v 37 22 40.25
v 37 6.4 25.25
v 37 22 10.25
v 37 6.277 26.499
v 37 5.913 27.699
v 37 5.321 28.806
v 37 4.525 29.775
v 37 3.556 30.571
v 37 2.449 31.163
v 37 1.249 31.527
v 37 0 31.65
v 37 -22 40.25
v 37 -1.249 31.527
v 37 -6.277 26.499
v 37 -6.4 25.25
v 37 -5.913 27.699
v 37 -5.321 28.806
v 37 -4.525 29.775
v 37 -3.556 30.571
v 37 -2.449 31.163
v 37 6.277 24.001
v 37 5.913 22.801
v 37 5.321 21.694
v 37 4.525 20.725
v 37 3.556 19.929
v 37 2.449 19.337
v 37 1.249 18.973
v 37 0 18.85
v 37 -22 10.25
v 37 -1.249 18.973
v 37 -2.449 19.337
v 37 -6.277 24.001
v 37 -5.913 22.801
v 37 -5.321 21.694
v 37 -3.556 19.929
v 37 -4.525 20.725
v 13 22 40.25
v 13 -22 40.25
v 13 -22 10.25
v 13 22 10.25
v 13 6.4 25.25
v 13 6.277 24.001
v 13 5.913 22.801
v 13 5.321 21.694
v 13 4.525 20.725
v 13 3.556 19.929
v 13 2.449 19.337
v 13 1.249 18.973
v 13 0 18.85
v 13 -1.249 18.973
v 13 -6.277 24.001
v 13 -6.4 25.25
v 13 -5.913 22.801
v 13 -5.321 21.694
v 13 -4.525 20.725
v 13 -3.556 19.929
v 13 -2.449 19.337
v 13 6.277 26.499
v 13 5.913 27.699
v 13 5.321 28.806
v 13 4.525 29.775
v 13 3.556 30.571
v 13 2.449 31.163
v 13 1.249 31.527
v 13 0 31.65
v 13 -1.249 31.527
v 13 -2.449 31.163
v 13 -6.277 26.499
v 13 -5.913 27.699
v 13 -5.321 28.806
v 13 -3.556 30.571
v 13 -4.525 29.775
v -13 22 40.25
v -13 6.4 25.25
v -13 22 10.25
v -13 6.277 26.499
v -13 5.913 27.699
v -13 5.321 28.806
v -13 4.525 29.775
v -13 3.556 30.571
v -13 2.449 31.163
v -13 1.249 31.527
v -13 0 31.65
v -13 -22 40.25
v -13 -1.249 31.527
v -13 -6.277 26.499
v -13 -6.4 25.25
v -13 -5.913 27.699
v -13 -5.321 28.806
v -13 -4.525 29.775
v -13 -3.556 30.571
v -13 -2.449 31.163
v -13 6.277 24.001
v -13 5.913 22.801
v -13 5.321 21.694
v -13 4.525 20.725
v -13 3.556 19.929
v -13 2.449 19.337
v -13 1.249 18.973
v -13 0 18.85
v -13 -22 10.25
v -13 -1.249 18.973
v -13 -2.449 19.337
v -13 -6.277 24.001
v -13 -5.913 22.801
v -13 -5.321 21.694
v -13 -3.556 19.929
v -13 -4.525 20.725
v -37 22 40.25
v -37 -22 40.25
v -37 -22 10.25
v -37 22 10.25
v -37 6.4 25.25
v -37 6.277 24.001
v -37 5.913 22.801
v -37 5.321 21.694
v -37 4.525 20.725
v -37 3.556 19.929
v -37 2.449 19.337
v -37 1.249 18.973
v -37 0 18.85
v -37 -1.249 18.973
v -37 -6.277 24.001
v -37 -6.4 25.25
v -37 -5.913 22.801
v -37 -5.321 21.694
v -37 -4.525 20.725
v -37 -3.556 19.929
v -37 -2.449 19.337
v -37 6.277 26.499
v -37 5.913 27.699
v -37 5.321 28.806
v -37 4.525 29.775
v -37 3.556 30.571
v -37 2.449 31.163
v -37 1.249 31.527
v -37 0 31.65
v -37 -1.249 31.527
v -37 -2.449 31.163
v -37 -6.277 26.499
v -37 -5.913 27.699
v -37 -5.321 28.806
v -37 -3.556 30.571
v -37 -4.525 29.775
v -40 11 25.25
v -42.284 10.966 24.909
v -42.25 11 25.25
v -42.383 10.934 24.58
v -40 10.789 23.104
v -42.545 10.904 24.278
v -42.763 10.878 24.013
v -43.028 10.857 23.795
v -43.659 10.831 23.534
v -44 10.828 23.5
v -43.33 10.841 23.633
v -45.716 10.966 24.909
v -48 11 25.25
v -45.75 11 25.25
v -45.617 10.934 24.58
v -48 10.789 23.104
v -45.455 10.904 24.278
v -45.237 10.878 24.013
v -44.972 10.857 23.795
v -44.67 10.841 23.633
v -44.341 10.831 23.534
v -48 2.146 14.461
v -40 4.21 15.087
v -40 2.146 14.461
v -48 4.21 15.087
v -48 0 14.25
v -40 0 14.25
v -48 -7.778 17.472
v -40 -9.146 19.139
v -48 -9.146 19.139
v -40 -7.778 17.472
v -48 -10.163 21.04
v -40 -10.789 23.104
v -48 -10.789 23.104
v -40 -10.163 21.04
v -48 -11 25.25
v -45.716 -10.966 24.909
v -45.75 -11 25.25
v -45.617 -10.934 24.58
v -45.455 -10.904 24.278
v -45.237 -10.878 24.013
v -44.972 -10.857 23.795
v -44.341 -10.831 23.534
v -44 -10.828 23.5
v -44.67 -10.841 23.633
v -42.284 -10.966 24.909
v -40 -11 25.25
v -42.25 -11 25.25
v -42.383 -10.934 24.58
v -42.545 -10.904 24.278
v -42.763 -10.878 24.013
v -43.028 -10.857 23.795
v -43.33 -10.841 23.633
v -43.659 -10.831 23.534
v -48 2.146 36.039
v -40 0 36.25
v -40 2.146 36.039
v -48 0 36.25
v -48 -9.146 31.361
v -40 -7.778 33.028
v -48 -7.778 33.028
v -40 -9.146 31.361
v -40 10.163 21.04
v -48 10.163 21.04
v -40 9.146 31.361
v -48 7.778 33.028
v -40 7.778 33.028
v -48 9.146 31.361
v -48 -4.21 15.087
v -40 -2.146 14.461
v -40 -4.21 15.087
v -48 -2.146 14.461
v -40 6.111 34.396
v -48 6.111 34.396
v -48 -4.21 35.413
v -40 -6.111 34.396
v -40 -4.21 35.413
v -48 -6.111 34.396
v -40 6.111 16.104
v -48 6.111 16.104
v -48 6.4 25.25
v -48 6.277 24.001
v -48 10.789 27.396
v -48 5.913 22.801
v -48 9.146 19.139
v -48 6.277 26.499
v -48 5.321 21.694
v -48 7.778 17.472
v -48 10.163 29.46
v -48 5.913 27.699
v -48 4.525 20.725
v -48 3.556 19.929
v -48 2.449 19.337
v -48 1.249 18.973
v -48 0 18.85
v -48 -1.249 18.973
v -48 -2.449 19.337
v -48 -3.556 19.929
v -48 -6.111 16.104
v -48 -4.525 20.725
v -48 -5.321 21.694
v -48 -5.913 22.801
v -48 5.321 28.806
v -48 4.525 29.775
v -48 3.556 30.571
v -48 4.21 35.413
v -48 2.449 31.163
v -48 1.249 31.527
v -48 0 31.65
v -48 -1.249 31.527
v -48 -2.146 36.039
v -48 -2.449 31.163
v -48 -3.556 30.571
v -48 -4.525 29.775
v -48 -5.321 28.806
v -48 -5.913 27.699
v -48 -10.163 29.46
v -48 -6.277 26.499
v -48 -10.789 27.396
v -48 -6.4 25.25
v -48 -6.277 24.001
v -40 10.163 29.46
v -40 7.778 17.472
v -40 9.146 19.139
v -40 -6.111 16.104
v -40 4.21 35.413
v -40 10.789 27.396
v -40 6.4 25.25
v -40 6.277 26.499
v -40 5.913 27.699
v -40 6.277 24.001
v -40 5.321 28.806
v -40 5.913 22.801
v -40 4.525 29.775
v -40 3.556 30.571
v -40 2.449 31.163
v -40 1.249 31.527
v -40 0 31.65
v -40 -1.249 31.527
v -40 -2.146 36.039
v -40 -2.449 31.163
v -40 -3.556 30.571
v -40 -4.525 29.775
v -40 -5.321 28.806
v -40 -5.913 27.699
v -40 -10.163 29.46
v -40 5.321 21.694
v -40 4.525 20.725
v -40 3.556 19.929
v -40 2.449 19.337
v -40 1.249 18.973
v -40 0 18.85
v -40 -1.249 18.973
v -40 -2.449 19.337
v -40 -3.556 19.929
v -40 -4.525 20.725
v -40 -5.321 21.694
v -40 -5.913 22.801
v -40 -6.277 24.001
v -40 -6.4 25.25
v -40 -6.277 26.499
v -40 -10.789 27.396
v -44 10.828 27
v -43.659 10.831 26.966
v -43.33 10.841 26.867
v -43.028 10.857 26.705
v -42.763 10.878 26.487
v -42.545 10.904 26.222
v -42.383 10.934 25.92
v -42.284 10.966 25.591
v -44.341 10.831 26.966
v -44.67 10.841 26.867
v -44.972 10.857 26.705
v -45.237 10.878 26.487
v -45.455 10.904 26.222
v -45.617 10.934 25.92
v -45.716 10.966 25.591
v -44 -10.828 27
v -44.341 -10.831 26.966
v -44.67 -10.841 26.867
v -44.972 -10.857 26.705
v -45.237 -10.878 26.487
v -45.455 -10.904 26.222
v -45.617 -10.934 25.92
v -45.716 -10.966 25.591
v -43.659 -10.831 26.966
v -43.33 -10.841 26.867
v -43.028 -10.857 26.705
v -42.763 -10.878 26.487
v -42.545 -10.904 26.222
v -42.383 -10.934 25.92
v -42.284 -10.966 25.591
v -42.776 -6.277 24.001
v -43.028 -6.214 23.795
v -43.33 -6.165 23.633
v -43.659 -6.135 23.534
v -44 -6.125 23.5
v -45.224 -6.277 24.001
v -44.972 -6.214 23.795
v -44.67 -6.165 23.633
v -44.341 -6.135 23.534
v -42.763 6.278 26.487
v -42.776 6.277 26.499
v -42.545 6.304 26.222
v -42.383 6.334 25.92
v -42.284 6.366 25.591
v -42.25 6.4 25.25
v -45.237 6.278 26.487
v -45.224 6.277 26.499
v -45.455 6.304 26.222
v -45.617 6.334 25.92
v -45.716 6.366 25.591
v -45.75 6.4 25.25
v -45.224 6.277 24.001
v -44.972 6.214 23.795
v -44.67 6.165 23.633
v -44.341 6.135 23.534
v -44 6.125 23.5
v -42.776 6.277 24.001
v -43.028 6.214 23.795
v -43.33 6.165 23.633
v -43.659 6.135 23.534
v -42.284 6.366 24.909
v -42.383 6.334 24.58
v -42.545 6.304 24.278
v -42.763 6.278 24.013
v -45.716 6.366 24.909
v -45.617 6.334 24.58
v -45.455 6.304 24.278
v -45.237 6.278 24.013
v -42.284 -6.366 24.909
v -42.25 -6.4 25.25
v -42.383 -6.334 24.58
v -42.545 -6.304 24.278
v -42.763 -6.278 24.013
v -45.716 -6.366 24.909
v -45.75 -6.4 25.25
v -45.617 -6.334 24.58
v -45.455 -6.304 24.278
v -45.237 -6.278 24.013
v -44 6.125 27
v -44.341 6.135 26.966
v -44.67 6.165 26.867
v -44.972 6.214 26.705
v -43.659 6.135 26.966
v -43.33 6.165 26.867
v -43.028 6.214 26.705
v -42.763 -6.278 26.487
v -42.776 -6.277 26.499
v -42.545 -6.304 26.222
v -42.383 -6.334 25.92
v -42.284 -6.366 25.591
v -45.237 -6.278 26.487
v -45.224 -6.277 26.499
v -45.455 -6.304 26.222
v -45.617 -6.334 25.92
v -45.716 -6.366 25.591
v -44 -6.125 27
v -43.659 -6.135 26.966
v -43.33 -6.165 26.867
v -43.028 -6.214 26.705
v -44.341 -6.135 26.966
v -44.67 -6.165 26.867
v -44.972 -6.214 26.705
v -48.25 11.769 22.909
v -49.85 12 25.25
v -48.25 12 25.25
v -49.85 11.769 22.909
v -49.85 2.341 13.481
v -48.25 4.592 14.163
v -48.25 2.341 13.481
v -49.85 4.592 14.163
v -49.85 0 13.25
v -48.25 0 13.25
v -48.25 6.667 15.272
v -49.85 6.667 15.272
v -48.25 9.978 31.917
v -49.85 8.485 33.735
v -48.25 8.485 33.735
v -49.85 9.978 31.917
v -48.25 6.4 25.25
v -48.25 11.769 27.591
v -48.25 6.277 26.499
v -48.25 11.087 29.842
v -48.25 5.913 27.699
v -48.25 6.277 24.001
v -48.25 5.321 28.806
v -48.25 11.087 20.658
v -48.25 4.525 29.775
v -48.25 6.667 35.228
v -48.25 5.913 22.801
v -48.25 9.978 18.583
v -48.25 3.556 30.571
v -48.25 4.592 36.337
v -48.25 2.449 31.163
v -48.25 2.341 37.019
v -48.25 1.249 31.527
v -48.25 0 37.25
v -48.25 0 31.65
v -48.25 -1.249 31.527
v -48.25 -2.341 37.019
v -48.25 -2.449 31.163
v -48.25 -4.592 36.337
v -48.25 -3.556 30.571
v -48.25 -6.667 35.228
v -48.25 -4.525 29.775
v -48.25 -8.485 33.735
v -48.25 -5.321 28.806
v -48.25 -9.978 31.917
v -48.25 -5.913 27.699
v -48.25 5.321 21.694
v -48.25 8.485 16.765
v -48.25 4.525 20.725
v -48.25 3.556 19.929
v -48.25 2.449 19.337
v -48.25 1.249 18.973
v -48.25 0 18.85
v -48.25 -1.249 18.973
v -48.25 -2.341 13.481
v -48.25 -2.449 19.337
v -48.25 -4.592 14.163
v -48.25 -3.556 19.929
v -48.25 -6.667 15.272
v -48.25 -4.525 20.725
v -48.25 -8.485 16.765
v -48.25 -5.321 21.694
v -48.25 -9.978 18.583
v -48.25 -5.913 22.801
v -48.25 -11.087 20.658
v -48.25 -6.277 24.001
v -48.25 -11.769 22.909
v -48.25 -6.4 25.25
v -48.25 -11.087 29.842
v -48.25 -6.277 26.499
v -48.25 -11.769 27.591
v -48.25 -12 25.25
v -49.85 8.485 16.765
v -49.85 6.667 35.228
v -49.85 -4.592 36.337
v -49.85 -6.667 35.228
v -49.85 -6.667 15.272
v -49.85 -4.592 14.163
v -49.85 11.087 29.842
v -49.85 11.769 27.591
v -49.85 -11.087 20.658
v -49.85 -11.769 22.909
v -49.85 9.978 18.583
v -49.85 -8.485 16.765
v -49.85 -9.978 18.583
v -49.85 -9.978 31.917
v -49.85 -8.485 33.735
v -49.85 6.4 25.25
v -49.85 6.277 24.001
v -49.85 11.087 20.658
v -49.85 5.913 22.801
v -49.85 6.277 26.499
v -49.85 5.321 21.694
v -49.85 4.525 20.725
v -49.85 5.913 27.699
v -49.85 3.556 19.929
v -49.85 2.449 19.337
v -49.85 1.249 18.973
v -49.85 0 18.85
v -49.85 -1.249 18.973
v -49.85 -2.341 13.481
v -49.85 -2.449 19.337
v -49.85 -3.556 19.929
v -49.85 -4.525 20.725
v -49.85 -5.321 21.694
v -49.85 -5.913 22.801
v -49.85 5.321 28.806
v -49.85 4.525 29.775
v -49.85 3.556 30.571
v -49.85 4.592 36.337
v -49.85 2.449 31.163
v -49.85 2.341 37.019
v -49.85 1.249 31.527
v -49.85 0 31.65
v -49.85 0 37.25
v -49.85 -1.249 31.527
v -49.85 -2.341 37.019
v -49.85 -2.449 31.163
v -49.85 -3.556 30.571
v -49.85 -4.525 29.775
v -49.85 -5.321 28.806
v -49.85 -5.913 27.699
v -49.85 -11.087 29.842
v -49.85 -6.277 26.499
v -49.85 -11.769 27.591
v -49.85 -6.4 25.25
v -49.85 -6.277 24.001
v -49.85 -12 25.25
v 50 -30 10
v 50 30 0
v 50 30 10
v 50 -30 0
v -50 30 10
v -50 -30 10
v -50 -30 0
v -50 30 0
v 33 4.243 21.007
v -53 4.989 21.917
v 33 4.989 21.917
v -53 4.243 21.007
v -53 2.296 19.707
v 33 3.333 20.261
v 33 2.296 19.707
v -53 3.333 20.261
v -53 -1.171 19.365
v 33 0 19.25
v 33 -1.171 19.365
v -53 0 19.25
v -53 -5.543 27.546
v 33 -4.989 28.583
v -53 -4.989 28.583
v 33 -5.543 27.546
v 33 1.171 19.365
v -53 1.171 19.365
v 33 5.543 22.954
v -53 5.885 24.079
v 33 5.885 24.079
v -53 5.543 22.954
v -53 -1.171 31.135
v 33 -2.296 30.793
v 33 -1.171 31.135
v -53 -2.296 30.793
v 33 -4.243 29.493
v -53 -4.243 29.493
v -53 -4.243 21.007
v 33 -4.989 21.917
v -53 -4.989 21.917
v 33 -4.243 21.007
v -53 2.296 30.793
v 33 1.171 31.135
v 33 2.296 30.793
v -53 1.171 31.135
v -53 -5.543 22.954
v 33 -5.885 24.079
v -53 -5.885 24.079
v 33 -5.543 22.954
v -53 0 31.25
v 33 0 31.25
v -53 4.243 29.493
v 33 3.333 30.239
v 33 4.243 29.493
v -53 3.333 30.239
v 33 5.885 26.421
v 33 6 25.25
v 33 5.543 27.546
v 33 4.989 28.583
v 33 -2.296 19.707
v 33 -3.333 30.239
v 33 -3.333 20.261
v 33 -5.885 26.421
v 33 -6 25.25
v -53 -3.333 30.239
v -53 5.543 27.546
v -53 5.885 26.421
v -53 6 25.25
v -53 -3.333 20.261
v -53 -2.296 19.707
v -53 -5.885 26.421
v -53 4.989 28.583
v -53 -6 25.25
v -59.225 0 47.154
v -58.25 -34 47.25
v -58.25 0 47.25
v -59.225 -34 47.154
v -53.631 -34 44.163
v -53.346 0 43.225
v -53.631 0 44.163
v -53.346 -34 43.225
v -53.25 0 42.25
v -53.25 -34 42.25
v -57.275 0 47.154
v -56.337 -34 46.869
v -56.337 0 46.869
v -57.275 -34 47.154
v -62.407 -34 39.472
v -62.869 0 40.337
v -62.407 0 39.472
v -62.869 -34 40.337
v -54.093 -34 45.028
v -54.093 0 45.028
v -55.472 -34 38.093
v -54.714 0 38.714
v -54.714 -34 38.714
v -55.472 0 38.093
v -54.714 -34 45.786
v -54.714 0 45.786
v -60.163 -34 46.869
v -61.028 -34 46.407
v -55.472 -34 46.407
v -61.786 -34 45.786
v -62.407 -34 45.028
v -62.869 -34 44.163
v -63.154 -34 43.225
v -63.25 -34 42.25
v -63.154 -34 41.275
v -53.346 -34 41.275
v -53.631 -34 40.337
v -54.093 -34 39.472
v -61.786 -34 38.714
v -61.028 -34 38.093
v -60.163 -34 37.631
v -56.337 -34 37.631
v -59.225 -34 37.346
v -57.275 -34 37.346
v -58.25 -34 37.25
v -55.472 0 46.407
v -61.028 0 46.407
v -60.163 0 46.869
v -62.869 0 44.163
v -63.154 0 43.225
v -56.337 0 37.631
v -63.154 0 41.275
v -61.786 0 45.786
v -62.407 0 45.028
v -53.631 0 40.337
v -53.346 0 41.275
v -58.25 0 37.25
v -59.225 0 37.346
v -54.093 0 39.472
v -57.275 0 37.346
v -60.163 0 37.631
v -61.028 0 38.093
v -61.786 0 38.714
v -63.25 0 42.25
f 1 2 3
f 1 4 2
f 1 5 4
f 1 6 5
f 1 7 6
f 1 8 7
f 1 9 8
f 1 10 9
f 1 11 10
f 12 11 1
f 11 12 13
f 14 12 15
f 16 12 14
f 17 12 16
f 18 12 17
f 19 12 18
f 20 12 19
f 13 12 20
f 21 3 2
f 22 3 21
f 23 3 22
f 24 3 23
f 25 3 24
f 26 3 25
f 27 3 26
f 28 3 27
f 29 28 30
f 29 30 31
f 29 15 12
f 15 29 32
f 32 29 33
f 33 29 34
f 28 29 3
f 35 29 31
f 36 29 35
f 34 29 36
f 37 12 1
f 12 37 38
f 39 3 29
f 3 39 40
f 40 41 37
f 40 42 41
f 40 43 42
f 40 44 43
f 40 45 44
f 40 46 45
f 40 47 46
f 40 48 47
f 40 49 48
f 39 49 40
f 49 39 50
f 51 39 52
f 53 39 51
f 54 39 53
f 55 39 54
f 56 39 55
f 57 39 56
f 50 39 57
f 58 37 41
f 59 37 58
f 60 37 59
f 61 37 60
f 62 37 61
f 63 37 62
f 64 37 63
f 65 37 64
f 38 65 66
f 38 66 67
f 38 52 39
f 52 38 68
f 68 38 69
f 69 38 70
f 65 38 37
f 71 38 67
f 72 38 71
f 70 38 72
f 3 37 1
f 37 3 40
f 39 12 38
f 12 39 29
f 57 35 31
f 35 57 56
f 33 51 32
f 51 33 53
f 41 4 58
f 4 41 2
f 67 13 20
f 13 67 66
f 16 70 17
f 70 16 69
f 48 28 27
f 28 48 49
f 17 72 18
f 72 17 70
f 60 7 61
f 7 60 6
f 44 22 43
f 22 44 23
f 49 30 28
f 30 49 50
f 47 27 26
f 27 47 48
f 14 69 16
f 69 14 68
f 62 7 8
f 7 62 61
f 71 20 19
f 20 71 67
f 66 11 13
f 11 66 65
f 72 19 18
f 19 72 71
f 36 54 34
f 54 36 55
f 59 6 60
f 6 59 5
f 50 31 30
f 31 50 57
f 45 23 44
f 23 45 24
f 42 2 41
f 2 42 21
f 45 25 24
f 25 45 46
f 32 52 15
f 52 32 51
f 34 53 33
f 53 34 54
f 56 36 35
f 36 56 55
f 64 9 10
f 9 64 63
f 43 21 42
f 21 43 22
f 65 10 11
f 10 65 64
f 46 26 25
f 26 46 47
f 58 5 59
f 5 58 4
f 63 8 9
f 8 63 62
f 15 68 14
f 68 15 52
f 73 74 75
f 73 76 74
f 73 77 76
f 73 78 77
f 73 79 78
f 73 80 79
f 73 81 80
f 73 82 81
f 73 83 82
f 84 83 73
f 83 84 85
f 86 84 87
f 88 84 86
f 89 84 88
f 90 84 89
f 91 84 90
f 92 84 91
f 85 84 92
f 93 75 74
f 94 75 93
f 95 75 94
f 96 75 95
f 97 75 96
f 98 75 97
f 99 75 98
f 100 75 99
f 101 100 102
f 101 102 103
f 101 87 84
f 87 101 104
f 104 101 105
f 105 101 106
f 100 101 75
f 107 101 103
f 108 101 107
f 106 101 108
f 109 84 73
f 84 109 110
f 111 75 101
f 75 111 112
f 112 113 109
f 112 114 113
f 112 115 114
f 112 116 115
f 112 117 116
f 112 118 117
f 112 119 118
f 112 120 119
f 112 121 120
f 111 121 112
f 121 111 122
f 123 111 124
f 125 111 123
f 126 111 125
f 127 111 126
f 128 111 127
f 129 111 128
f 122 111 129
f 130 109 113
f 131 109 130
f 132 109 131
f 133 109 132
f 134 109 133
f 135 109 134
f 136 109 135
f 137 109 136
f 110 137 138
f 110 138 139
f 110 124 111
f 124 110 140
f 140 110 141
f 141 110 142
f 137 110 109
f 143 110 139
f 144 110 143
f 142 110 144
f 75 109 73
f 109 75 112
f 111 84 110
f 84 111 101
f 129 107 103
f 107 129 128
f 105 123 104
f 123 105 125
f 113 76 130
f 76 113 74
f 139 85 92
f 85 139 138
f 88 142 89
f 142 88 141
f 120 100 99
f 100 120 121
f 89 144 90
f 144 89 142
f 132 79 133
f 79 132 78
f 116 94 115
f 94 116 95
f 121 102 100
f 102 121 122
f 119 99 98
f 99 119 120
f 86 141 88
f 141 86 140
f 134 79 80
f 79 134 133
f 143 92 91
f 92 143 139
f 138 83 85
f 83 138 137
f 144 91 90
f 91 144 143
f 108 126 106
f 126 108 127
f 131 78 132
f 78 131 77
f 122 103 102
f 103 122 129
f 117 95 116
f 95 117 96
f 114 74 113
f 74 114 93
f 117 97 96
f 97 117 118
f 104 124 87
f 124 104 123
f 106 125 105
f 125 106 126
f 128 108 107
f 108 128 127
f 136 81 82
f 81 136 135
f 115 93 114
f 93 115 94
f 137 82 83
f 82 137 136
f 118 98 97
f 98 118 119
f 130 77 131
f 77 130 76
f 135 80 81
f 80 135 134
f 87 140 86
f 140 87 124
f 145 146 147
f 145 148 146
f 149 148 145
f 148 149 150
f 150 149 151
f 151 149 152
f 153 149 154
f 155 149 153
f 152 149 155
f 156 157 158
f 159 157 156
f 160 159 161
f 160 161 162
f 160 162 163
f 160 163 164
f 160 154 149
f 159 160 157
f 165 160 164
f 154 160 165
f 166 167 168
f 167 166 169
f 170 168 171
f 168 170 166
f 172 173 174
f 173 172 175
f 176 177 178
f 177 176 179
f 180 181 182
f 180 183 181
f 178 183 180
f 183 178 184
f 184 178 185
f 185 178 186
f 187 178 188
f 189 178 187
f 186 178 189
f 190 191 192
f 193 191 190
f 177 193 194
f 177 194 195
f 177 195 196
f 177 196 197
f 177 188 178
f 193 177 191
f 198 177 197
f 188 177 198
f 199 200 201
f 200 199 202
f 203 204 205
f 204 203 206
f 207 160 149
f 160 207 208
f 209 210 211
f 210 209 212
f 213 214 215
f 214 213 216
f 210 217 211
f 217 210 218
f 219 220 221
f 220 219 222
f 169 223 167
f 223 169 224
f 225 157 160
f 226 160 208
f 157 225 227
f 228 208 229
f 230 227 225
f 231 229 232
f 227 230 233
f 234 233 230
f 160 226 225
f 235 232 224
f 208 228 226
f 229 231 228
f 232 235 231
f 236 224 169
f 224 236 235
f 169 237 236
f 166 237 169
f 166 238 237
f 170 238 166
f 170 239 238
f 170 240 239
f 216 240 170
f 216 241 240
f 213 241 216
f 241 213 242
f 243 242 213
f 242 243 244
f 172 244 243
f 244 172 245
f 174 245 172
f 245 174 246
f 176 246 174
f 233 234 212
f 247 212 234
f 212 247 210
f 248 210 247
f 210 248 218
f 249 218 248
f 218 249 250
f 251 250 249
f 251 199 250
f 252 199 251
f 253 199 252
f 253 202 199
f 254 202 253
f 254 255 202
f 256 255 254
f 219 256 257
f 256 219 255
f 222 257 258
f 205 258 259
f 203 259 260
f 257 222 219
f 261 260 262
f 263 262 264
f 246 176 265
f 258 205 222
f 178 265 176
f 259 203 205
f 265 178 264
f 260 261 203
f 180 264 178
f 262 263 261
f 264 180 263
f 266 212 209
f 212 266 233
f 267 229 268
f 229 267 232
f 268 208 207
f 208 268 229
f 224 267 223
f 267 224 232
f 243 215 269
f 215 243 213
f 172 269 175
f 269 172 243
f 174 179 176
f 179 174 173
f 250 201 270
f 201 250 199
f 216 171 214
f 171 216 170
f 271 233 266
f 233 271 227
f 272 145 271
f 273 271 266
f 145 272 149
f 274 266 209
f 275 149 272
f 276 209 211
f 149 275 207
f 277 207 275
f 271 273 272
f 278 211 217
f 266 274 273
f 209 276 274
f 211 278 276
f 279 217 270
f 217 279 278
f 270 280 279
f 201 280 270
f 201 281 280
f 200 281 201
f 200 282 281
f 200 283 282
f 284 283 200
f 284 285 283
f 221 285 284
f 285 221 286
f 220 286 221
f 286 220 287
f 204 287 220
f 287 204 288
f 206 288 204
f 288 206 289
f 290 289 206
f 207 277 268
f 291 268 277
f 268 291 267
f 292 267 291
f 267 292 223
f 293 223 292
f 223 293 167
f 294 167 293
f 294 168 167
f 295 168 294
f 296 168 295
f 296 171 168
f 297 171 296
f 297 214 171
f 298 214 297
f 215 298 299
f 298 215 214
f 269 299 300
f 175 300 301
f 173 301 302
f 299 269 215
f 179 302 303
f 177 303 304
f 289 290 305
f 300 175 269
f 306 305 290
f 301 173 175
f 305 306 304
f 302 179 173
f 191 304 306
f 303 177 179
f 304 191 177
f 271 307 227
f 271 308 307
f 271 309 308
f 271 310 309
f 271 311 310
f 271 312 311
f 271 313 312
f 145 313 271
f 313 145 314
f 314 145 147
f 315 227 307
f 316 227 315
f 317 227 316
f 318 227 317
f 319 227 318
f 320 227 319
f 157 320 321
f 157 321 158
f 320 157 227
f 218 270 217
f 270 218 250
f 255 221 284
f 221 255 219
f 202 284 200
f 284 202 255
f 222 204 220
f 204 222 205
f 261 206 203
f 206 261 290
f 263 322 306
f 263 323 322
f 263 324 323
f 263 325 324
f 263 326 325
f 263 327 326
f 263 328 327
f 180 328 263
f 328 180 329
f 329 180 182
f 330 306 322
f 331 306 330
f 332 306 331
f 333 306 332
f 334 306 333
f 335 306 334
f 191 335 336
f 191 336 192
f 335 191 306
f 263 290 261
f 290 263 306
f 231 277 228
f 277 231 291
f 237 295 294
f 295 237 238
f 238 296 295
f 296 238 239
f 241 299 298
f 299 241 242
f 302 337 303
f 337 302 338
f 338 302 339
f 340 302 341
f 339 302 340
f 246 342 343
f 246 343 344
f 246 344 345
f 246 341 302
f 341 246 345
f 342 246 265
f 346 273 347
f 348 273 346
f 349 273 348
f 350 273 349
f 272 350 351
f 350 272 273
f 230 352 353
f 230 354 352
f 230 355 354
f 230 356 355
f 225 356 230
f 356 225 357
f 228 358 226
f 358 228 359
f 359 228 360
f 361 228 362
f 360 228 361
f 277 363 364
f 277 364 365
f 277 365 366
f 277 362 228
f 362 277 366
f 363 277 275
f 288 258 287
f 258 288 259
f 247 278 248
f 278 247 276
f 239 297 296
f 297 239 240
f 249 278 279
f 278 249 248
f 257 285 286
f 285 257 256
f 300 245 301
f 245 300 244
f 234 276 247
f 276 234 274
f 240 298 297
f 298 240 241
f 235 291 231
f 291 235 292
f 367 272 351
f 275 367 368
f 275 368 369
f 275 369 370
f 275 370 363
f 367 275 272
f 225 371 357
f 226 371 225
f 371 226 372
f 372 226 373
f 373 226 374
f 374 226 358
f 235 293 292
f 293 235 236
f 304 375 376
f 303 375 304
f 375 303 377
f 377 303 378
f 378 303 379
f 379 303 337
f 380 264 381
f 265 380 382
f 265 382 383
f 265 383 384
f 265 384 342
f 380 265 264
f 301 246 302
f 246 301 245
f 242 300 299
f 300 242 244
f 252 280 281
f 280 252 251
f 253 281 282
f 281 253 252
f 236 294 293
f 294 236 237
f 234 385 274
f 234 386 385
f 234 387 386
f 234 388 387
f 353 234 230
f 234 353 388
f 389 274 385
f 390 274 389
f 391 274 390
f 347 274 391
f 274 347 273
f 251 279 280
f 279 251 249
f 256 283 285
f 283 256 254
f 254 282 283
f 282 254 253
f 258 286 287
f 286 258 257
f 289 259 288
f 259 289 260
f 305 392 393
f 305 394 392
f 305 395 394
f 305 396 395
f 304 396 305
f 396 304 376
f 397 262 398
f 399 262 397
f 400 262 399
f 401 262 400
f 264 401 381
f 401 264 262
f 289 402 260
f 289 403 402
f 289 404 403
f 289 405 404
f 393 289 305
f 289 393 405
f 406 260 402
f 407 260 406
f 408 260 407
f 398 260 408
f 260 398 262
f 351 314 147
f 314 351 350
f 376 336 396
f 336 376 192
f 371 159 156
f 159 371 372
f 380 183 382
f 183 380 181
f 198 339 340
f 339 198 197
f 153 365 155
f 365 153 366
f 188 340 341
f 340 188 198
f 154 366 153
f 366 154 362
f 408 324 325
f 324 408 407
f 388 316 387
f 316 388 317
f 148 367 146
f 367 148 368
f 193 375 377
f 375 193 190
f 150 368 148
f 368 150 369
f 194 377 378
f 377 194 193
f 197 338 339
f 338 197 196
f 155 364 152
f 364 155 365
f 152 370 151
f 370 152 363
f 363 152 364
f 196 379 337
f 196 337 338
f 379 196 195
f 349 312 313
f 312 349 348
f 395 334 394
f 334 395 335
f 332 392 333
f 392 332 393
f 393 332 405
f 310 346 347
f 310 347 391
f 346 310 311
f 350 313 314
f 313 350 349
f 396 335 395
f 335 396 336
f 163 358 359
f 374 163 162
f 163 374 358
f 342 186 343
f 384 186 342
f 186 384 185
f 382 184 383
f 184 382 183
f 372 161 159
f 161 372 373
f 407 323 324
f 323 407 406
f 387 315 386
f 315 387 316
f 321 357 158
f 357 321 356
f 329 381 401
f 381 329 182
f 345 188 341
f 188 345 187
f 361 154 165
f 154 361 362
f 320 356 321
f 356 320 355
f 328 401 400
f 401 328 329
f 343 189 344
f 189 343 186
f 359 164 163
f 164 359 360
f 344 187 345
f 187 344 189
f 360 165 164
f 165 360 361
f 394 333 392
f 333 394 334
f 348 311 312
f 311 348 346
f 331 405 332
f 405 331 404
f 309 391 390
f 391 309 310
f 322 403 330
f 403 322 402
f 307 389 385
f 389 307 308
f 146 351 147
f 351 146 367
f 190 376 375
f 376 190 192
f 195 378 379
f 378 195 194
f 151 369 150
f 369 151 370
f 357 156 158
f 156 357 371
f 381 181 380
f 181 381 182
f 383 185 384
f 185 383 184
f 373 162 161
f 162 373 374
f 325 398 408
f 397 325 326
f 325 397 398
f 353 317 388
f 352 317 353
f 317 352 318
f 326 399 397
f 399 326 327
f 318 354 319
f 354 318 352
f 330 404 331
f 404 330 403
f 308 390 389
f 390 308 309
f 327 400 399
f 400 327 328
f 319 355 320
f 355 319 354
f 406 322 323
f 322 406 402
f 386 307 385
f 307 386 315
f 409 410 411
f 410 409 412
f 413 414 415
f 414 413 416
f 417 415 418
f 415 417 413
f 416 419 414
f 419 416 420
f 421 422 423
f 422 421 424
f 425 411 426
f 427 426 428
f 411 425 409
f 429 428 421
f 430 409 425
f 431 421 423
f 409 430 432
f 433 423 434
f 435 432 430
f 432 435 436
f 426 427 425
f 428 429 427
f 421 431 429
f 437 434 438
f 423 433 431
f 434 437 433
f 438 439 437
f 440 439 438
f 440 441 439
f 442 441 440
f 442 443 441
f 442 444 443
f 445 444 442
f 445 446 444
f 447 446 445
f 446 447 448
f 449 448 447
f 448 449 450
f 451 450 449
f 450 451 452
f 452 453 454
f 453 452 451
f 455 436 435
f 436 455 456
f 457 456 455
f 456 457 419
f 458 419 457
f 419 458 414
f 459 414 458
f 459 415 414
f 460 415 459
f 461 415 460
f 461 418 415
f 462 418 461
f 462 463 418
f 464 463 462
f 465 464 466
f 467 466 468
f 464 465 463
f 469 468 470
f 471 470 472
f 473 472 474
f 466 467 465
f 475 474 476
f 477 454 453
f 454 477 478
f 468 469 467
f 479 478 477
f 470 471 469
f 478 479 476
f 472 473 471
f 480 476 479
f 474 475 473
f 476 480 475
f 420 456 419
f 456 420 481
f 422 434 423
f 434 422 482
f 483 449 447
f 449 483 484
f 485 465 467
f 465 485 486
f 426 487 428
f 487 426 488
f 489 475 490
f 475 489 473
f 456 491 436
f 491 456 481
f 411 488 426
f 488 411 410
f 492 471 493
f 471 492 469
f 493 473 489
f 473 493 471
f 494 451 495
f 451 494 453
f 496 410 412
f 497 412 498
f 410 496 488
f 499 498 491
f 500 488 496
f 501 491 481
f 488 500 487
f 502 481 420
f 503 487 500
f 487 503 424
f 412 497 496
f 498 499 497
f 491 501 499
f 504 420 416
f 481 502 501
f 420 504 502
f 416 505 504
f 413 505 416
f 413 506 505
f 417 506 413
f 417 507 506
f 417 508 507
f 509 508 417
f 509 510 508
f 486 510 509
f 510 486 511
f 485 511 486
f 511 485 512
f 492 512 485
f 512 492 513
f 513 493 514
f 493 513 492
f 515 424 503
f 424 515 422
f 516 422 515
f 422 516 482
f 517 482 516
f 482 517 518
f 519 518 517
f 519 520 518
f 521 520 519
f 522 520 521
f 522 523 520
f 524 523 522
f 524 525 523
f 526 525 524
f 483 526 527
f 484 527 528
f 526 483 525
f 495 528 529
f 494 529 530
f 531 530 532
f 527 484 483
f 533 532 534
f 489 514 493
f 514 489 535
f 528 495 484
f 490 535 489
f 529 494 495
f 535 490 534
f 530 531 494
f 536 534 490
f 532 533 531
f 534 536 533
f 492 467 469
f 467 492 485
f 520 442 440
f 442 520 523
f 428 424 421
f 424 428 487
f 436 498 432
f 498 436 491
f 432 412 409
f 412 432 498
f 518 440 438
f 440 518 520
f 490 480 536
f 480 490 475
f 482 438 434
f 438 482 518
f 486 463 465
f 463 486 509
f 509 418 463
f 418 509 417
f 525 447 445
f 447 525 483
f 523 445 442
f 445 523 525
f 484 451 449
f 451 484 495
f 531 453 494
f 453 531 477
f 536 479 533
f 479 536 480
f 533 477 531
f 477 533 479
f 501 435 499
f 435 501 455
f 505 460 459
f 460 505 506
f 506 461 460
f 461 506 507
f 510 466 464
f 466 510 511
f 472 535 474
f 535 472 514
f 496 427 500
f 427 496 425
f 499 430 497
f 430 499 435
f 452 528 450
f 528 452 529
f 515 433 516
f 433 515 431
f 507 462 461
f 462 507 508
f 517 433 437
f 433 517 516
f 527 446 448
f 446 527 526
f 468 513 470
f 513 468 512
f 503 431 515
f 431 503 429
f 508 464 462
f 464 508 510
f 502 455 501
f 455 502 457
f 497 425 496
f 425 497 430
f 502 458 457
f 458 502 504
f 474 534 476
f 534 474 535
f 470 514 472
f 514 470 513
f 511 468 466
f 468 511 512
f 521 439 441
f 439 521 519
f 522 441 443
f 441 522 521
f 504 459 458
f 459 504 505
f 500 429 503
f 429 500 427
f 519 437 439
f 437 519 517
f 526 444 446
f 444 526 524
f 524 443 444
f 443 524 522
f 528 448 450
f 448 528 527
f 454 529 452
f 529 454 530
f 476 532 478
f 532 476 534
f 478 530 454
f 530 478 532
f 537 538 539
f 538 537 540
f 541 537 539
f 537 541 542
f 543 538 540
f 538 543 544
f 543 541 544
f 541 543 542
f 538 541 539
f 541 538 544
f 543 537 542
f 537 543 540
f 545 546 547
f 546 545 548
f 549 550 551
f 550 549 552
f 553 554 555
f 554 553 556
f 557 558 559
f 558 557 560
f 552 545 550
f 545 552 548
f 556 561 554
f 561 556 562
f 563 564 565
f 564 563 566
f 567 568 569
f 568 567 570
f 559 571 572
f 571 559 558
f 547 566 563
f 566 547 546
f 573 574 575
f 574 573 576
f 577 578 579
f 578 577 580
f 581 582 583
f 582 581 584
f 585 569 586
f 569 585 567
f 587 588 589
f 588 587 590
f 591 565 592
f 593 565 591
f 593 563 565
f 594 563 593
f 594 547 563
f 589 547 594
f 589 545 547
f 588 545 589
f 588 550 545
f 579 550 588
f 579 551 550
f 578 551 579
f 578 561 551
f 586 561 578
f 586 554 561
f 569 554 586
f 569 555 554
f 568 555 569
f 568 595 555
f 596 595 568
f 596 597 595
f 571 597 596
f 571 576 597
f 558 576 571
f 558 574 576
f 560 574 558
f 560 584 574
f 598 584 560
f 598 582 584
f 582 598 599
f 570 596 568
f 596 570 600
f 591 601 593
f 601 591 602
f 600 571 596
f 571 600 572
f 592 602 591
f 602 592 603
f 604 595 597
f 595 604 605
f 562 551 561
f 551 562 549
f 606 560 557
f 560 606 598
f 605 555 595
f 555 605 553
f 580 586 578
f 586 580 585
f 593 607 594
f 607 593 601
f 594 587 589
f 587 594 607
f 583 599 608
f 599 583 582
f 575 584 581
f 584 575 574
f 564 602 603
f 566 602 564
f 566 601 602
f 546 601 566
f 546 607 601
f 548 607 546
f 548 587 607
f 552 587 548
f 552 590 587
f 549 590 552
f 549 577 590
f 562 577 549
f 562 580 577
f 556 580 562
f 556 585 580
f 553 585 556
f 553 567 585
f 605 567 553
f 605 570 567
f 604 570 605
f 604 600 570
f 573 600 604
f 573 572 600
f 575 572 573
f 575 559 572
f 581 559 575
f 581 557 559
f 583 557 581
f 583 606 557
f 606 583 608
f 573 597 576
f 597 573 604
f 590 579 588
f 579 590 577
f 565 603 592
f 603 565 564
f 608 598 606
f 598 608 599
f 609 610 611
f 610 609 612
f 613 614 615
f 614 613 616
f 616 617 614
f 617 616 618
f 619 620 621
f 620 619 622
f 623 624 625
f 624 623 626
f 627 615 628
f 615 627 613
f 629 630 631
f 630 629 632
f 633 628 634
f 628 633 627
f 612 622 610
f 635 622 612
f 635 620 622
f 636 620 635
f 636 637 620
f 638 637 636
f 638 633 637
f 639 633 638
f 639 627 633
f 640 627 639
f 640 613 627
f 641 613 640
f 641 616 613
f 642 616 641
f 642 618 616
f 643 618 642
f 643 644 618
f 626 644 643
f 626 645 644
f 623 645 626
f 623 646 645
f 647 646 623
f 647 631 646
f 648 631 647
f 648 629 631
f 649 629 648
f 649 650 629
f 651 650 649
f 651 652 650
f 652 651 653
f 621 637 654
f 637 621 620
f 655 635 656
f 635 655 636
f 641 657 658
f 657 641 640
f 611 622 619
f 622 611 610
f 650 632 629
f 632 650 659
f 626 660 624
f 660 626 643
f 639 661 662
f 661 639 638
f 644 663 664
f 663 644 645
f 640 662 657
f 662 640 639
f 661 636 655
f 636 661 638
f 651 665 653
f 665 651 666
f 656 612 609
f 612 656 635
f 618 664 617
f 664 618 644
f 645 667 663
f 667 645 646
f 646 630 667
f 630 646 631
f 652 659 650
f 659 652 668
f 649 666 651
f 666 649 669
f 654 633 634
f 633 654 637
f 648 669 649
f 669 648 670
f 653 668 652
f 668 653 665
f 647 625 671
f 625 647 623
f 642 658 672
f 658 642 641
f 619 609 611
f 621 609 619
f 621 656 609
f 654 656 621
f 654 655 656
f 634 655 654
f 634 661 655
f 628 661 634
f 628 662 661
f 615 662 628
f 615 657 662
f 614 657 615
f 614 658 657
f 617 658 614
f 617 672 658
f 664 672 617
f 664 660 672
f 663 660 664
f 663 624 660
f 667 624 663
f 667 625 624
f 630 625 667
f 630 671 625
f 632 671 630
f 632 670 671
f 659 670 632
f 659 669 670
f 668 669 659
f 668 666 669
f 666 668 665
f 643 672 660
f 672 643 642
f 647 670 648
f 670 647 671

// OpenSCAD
$fn = 32;

// ------------------------------------------------------------------------
// Machine vise: screw d12, jaws 24 x 30 mm
// Every part is its own module, assembly() places every instance.
// ------------------------------------------------------------------------

// --- part 1 ---
module vise_bed() {
  difference() {
    translate([-50, -30, 0]) cube([100, 60, 10]);
  }
}

// --- part 2 ---
module vise_jaw() {
  difference() {
    translate([-12, -22, 0]) cube([24, 44, 30]);
    translate([0, 0, 15]) rotate([0, 90, 0]) cylinder(h = 26, d = 12.8, center = true);
  }
}

// --- part 3 ---
module vise_screw() {
  translate([0, 0, -43]) cylinder(h = 86, d = 12);
}

// --- part 4 ---
module screw_collar() {
  difference() {
    cylinder(h = 8, d = 22);
    translate([0, 0, -1]) cylinder(h = 10, d = 12.8);
    translate([0, 0, 4]) rotate([90, 0, 0]) cylinder(h = 24, d = 3.5, center = true);
  }
}

// --- part 5 ---
module screw_washer() {
  difference() {
      translate([0, 0, 0]) cylinder(h = 1.6, d = 24);
      translate([0, 0, -1]) cylinder(h = 3.6, d = 12.8);
    }
}

// --- part 6 ---
module vise_handle() {
  cylinder(h = 34, d = 10);
}

// --- assembly ---
module assembly() {
  color([0.80, 0.24, 0.20]) translate([0, 0, 0]) rotate([0, 0, 0]) vise_bed();
  color([0.20, 0.45, 0.75]) translate([25, 0, 10.25]) rotate([0, 0, 0]) vise_jaw();
  color([0.25, 0.62, 0.32]) translate([-25, 0, 10.25]) rotate([0, 0, 0]) vise_jaw();
  color([0.92, 0.70, 0.18]) translate([-10, 0, 25.25]) rotate([0, 90, 0]) vise_screw();
  color([0.58, 0.35, 0.70]) translate([-48, 0, 25.25]) rotate([0, 90, 0]) screw_collar();
  color([0.16, 0.66, 0.66]) translate([-49.85, 0, 25.25]) rotate([0, 90, 0]) screw_washer();
  color([0.85, 0.48, 0.18]) translate([-58.25, 0, 42.25]) rotate([90, 0, 0]) vise_handle();
}

assembly();
